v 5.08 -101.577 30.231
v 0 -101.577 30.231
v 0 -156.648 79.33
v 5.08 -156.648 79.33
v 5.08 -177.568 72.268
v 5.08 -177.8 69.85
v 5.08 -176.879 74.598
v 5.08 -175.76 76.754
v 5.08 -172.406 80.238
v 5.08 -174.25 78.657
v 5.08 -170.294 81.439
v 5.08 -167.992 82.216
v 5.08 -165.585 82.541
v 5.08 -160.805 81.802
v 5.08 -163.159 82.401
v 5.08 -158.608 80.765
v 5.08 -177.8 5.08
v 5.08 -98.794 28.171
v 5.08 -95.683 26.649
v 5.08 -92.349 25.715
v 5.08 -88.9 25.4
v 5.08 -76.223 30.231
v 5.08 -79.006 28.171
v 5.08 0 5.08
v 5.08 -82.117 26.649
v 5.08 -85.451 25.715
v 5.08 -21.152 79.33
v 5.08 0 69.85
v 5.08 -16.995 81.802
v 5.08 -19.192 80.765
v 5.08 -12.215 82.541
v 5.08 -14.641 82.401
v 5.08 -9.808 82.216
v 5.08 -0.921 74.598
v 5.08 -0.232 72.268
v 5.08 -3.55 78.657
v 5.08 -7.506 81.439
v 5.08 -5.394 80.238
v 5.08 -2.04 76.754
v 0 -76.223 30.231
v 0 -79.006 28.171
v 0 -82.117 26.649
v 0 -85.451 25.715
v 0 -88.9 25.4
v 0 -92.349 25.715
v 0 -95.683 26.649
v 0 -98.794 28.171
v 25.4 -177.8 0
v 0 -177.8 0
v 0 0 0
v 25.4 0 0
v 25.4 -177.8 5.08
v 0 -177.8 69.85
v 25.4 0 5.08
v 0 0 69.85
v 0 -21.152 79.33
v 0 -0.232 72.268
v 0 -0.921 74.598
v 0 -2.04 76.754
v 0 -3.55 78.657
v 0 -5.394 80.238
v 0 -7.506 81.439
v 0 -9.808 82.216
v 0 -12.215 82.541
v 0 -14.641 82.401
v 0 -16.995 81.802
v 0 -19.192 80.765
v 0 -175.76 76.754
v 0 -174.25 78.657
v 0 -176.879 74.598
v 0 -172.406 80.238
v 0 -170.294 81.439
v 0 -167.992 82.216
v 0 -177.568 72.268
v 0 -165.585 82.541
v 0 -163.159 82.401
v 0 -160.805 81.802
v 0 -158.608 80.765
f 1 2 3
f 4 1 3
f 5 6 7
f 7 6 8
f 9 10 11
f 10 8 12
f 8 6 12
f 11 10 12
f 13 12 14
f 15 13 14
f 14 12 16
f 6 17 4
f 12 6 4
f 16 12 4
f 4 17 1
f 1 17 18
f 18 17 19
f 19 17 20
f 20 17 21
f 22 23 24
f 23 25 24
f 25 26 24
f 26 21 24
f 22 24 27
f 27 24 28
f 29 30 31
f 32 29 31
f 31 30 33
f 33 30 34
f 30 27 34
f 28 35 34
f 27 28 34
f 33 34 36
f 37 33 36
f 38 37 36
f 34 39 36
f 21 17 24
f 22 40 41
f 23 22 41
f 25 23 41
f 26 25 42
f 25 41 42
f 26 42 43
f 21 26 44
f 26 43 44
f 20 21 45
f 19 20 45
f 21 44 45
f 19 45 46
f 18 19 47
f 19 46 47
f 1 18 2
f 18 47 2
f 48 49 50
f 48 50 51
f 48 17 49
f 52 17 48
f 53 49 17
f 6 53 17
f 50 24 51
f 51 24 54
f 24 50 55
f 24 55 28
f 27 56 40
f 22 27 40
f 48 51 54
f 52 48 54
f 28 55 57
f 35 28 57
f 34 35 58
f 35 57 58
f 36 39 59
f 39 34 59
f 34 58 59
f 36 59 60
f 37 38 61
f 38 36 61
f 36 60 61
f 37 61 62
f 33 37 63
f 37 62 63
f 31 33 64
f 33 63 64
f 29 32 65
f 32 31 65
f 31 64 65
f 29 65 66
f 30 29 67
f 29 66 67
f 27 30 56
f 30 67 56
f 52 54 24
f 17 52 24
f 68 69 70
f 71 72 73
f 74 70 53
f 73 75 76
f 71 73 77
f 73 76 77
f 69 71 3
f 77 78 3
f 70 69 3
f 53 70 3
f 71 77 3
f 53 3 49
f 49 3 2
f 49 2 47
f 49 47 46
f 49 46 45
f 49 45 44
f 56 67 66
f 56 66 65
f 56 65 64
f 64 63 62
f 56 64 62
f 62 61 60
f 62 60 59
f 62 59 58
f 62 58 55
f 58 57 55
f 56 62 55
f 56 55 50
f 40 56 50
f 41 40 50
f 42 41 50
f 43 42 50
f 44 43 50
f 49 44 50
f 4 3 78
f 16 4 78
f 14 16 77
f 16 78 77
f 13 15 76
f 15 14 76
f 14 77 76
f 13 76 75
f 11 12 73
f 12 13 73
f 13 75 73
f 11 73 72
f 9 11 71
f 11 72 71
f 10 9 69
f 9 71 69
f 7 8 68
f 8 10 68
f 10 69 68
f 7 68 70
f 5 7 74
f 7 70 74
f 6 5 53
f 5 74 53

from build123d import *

# Parameters (mm, degrees)
F1_DEPTH = 177.8
F4_DEPTH = 25.4


with BuildPart() as f1:
    # F0 (on Front) → F1 (new body)
    with BuildSketch(Plane.XZ):
        Polygon((0, 82.55), (0, 0), (25.4, 0), (25.4, 5.08), (5.08, 5.08), (5.08, 82.55), align=None)
    extrude(amount=F1_DEPTH)

    # F3 (on face) → F4 (cut)
    with BuildSketch(Plane(origin=(0, 0, 0), x_dir=(0, -1, 0), z_dir=(-1, 0, 0))):
        with BuildLine():
            ThreePointArc((0, 69.85), (7.505978, 81.439311), (21.151517, 79.32955))
            Line((21.151517, 79.32955), (76.222725, 30.230675))
            ThreePointArc((76.222725, 30.230675), (88.9, 25.4), (101.577275, 30.230675))
            Line((101.577275, 30.230675), (156.648483, 79.32955))
            ThreePointArc((156.648483, 79.32955), (170.294022, 81.439311), (177.8, 69.85))
            Line((177.8, 69.85), (203.2, 69.85))
            Line((203.2, 69.85), (203.2, 95.25))
            Line((203.2, 95.25), (-25.4, 95.25))
            Line((-25.4, 95.25), (-25.4, 69.85))
            Line((-25.4, 69.85), (0, 69.85))
        make_face()
    extrude(amount=-F4_DEPTH, mode=Mode.SUBTRACT)


solid = f1.part
